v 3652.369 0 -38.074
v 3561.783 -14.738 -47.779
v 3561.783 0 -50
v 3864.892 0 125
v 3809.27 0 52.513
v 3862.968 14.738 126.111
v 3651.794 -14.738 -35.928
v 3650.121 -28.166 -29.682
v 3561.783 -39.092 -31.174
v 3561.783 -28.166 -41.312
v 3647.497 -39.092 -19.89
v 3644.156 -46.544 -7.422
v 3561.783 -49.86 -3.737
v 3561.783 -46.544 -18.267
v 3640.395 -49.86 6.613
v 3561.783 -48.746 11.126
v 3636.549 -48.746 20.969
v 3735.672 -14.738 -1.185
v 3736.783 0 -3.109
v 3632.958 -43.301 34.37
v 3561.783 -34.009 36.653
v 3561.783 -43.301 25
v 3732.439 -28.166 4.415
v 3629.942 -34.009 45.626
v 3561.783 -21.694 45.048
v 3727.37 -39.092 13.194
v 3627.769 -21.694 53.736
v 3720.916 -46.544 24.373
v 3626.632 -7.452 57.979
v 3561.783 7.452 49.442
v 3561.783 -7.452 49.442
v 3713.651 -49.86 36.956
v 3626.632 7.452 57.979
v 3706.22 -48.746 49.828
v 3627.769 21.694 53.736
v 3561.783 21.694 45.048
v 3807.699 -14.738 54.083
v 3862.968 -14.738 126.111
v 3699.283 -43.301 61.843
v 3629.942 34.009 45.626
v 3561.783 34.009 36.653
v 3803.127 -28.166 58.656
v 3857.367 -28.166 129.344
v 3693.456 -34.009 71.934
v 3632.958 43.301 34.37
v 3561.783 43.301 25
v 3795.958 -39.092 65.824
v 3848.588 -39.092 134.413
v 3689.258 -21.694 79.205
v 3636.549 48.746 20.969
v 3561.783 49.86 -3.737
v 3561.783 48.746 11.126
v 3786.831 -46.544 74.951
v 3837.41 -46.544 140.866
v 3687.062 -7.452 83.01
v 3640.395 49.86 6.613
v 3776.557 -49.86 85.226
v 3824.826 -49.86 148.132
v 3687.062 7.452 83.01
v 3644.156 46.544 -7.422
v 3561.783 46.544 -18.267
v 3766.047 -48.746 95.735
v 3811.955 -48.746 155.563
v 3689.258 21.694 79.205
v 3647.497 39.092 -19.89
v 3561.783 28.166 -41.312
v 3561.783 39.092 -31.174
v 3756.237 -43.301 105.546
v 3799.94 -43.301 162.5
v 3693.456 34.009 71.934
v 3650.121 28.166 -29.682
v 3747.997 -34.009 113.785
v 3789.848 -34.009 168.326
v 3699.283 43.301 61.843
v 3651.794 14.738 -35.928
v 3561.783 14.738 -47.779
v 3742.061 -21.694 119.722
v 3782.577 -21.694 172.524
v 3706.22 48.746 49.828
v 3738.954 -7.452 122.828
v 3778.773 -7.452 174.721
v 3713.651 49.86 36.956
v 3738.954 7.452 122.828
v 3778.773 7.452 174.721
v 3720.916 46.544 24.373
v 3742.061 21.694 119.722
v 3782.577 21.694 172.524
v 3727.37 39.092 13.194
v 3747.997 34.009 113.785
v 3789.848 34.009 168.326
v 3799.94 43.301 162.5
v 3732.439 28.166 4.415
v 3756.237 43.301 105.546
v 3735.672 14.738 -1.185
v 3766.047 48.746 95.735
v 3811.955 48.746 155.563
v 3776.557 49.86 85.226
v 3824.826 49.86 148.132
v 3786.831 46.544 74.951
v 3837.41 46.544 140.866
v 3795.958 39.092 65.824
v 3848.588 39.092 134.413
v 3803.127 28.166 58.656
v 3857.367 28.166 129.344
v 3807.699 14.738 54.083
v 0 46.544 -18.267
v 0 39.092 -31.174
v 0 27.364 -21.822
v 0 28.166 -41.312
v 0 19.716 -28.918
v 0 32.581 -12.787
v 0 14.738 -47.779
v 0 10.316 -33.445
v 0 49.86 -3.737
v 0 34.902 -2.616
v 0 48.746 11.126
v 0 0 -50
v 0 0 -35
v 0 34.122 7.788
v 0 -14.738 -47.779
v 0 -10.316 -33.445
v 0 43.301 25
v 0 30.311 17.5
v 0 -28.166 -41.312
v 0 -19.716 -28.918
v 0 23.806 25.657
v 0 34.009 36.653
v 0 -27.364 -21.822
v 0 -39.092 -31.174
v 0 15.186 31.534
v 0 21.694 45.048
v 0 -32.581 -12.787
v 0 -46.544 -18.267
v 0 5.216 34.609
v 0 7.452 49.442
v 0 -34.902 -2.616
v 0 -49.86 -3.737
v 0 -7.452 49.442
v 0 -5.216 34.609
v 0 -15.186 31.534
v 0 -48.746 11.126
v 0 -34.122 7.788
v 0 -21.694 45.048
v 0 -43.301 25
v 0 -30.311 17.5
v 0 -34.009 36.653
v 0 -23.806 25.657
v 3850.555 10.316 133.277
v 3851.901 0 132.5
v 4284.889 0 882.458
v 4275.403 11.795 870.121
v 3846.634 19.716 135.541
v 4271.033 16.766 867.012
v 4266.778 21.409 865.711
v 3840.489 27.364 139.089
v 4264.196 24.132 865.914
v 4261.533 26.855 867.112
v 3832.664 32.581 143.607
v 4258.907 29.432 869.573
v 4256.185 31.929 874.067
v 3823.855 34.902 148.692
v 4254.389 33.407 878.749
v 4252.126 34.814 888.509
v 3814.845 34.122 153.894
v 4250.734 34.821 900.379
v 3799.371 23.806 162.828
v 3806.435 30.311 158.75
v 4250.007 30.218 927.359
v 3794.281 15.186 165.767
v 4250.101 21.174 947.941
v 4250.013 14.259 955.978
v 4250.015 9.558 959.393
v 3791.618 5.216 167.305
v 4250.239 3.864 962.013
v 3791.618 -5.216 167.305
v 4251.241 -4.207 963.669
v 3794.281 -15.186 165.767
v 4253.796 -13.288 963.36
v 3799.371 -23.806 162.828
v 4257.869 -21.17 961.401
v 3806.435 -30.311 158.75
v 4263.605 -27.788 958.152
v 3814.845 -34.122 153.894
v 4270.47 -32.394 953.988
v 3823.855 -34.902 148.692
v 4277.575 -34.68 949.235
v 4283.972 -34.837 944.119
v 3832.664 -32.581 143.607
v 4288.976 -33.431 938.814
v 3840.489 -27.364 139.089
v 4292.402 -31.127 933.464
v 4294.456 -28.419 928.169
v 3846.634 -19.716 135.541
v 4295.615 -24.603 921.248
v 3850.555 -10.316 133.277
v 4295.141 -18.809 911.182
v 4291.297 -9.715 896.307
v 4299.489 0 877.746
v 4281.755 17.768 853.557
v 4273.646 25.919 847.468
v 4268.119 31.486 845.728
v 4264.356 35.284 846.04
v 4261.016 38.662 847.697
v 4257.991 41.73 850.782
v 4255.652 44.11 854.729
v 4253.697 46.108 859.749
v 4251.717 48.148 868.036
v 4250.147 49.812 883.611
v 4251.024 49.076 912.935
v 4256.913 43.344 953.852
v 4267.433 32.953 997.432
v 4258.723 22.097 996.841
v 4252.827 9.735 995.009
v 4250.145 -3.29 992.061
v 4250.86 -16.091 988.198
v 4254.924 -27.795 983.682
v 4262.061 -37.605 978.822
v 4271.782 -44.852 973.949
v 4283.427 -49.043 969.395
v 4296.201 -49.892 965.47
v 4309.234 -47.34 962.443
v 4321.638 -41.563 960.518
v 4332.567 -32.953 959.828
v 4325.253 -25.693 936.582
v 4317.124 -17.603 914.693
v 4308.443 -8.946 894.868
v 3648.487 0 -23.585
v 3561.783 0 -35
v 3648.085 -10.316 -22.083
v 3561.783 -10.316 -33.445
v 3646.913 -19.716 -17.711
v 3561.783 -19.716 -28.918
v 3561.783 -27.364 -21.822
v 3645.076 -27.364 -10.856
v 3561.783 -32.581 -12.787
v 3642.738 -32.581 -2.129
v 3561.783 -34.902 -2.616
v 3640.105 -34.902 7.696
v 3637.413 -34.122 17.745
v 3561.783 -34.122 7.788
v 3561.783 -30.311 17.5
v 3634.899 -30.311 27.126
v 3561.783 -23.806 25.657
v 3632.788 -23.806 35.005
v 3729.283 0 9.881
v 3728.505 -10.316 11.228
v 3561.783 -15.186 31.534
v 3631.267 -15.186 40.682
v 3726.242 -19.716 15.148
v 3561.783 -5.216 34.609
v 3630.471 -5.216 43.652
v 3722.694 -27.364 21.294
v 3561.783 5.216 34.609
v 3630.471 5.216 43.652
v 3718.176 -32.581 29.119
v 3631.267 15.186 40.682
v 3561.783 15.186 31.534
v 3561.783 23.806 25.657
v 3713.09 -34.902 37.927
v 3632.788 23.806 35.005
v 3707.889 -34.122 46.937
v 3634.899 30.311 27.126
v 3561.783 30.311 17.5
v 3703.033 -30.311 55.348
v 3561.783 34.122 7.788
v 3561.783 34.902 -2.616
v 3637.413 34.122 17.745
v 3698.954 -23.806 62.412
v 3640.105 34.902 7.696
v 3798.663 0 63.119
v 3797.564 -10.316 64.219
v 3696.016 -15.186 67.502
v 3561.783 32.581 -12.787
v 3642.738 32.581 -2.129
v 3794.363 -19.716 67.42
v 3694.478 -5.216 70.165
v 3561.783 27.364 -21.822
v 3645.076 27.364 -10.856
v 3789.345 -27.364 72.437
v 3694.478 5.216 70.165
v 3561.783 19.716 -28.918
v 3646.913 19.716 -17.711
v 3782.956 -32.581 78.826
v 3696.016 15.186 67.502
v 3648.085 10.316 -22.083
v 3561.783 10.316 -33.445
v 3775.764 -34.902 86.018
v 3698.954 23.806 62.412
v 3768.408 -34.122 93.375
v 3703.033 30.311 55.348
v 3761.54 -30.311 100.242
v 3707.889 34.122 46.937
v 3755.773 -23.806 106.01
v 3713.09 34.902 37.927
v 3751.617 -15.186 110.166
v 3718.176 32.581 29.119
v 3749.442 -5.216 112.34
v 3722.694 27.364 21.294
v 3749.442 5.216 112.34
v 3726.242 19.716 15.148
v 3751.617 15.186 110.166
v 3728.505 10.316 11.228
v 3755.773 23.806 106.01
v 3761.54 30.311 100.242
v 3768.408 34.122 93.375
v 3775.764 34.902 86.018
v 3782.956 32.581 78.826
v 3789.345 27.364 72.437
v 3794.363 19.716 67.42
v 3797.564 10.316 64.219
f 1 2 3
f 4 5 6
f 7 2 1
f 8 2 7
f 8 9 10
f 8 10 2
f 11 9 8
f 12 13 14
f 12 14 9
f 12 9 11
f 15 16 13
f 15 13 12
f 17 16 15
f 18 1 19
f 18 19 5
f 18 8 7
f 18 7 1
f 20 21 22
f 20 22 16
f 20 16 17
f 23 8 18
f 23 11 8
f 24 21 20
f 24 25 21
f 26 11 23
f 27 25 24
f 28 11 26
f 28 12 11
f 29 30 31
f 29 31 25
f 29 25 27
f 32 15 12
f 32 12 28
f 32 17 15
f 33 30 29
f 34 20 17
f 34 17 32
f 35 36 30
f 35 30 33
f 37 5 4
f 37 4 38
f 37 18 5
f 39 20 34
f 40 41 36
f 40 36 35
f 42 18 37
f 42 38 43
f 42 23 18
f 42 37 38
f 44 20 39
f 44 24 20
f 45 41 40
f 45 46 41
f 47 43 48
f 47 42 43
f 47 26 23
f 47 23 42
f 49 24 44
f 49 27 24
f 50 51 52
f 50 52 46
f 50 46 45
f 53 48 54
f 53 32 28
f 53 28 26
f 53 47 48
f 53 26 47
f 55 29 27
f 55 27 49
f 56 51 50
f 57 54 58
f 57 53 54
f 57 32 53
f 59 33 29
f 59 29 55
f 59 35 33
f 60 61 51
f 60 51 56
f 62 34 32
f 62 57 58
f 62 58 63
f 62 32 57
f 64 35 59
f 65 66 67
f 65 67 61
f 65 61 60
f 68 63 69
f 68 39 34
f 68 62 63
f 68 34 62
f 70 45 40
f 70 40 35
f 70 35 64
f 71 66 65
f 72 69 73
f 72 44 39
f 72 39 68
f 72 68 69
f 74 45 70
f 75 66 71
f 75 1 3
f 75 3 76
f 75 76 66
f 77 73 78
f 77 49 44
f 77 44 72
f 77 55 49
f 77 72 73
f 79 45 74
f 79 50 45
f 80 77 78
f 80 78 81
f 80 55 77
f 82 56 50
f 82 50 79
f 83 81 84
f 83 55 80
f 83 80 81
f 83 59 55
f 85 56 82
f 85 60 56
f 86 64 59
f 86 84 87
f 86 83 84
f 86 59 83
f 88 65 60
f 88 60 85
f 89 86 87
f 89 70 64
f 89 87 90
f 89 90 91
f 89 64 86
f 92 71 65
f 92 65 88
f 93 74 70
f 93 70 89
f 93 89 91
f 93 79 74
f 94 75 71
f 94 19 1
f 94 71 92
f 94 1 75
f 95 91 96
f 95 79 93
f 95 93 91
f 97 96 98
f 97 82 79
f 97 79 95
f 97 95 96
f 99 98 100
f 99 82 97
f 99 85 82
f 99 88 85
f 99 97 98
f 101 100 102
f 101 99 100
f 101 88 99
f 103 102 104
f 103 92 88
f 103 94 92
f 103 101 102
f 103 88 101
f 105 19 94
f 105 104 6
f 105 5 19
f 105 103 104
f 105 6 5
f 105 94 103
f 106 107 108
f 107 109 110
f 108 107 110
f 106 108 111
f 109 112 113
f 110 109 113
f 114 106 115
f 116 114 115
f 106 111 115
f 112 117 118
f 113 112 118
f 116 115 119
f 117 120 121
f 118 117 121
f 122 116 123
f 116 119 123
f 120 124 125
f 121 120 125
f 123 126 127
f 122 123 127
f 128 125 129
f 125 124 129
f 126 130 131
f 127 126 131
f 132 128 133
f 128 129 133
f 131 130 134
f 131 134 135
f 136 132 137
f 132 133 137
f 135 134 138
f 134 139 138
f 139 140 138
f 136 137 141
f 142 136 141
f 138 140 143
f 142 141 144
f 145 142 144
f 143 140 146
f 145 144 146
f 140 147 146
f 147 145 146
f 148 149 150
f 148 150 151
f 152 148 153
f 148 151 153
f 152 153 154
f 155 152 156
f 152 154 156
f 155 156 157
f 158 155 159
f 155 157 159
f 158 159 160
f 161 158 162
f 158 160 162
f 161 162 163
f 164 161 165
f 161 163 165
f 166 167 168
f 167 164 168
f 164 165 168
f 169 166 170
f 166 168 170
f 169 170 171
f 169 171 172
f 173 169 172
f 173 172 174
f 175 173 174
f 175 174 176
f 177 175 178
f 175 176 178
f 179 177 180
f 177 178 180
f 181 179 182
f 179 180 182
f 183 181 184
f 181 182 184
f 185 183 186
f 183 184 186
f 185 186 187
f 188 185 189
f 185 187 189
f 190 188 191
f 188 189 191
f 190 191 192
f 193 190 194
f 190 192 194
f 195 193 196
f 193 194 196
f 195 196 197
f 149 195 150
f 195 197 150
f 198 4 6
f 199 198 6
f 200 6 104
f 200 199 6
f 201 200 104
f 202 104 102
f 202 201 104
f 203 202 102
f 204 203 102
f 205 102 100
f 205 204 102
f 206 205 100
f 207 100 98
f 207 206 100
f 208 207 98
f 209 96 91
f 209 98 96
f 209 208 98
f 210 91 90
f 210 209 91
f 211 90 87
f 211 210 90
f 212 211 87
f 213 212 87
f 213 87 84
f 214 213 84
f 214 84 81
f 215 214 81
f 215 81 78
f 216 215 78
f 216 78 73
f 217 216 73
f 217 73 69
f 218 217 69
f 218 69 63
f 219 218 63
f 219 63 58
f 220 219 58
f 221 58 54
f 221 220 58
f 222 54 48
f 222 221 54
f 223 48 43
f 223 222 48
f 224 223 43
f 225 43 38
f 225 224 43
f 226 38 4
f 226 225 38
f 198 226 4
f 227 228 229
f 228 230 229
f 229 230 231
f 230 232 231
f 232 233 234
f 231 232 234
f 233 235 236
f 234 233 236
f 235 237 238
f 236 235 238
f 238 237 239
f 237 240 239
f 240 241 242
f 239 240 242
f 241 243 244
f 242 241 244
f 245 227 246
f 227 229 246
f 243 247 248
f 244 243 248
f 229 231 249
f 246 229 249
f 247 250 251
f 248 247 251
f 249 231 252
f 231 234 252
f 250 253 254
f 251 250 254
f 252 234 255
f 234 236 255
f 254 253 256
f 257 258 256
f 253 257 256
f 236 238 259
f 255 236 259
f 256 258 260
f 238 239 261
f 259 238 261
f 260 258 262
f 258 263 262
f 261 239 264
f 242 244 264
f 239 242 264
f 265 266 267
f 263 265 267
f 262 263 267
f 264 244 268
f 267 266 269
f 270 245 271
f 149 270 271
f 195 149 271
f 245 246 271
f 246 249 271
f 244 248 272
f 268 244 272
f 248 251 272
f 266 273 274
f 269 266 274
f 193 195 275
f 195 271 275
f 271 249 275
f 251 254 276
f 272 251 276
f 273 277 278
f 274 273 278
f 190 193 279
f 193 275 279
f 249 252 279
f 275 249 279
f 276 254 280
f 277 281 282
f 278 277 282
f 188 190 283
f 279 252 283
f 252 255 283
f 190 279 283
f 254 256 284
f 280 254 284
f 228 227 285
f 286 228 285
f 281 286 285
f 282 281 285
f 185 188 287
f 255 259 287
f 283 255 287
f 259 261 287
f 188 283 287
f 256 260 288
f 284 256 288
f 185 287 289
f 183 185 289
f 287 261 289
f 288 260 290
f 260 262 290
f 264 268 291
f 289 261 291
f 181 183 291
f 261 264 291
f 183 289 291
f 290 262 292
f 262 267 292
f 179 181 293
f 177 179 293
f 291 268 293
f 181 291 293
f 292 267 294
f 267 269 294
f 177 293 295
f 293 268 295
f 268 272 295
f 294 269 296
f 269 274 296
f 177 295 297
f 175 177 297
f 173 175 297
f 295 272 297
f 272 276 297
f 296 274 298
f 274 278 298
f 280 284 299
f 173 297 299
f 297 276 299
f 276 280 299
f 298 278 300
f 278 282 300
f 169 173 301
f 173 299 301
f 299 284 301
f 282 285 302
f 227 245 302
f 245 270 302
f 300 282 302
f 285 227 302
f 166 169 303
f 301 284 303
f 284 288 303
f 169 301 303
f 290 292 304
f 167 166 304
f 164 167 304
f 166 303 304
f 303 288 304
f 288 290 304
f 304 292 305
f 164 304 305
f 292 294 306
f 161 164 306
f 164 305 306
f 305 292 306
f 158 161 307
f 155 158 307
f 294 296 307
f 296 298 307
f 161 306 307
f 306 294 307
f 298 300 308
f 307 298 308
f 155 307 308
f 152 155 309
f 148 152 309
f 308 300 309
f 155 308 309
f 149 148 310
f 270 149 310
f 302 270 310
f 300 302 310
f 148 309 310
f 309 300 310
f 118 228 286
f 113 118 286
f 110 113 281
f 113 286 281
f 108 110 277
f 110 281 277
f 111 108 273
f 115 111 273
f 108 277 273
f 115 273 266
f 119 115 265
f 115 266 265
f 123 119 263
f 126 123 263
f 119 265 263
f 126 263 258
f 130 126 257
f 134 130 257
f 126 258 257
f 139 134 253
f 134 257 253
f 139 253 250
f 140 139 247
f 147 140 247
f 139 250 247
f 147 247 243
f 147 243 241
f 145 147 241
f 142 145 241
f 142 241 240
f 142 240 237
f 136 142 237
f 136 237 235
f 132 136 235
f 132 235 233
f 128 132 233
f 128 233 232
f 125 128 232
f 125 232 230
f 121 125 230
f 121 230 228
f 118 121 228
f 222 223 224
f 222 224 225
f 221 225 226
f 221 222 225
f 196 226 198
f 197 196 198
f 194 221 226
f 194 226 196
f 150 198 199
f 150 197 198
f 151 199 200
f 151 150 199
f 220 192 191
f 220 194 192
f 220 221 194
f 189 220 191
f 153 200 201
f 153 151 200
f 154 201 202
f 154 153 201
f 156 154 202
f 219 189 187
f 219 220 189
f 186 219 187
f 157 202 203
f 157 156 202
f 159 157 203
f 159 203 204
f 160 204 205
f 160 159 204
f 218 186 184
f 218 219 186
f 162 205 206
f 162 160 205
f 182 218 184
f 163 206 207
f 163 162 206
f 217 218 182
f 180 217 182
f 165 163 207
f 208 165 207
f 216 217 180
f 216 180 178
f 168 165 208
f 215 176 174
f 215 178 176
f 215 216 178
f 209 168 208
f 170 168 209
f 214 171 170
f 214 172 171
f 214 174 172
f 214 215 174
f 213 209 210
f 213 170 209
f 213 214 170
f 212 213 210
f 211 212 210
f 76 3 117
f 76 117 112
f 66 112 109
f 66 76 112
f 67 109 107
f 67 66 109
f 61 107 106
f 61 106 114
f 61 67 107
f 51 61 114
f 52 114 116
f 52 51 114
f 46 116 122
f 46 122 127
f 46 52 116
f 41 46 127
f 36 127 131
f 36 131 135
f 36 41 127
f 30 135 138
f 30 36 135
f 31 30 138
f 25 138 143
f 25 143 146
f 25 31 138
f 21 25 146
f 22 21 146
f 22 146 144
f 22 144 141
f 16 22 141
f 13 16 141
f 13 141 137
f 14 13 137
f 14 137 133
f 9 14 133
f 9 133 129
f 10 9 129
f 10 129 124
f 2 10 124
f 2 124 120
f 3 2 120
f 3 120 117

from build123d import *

# Parameters (mm, degrees)
SKETCH2_R               = 50
SKETCH2_R_2             = 35
CUT_EXTRUDE1_DEPTH      = 4422.603744923
CUT_EXTRUDE1_DEPTH_BACK = 4422.603744923
SKETCH5_R               = 50


with BuildPart() as part:
    # Sweep1: sweep along a path in Sketch1
    with BuildLine(Plane(origin=(0, 0, 0), x_dir=(1, 0, 0), z_dir=(0, 1, 0))) as sweep1_path:
        Line((0, 0), (3561.782625306, 0))
        ThreePointArc((3561.782625306, 0), (3711.782625306, -40.192378865), (3821.590246441, -150))
        Line((3821.590246441, -150), (4300, -978.63))
    # Sketch2 → Sweep1 (sweep)
    with BuildSketch(Plane(origin=(0, 0, 0), x_dir=(0, 0, -1), z_dir=(1, 0, 0))):
        Circle(SKETCH2_R)
        Circle(SKETCH2_R_2, mode=Mode.SUBTRACT)
    sweep(path=sweep1_path.line)

    # Sketch5 → Cut-Extrude1 (cut, two sides: drawn at the far end of the back side and taken through both)
    with BuildSketch(Plane(origin=(4300, 0, 978.63), x_dir=(1, 0, 0), z_dir=(0, 0.495590774858731, -0.8685561489477365)).offset(-CUT_EXTRUDE1_DEPTH_BACK)):
        Circle(SKETCH5_R)
    extrude(amount=CUT_EXTRUDE1_DEPTH + CUT_EXTRUDE1_DEPTH_BACK, mode=Mode.SUBTRACT)


solid = part.part
